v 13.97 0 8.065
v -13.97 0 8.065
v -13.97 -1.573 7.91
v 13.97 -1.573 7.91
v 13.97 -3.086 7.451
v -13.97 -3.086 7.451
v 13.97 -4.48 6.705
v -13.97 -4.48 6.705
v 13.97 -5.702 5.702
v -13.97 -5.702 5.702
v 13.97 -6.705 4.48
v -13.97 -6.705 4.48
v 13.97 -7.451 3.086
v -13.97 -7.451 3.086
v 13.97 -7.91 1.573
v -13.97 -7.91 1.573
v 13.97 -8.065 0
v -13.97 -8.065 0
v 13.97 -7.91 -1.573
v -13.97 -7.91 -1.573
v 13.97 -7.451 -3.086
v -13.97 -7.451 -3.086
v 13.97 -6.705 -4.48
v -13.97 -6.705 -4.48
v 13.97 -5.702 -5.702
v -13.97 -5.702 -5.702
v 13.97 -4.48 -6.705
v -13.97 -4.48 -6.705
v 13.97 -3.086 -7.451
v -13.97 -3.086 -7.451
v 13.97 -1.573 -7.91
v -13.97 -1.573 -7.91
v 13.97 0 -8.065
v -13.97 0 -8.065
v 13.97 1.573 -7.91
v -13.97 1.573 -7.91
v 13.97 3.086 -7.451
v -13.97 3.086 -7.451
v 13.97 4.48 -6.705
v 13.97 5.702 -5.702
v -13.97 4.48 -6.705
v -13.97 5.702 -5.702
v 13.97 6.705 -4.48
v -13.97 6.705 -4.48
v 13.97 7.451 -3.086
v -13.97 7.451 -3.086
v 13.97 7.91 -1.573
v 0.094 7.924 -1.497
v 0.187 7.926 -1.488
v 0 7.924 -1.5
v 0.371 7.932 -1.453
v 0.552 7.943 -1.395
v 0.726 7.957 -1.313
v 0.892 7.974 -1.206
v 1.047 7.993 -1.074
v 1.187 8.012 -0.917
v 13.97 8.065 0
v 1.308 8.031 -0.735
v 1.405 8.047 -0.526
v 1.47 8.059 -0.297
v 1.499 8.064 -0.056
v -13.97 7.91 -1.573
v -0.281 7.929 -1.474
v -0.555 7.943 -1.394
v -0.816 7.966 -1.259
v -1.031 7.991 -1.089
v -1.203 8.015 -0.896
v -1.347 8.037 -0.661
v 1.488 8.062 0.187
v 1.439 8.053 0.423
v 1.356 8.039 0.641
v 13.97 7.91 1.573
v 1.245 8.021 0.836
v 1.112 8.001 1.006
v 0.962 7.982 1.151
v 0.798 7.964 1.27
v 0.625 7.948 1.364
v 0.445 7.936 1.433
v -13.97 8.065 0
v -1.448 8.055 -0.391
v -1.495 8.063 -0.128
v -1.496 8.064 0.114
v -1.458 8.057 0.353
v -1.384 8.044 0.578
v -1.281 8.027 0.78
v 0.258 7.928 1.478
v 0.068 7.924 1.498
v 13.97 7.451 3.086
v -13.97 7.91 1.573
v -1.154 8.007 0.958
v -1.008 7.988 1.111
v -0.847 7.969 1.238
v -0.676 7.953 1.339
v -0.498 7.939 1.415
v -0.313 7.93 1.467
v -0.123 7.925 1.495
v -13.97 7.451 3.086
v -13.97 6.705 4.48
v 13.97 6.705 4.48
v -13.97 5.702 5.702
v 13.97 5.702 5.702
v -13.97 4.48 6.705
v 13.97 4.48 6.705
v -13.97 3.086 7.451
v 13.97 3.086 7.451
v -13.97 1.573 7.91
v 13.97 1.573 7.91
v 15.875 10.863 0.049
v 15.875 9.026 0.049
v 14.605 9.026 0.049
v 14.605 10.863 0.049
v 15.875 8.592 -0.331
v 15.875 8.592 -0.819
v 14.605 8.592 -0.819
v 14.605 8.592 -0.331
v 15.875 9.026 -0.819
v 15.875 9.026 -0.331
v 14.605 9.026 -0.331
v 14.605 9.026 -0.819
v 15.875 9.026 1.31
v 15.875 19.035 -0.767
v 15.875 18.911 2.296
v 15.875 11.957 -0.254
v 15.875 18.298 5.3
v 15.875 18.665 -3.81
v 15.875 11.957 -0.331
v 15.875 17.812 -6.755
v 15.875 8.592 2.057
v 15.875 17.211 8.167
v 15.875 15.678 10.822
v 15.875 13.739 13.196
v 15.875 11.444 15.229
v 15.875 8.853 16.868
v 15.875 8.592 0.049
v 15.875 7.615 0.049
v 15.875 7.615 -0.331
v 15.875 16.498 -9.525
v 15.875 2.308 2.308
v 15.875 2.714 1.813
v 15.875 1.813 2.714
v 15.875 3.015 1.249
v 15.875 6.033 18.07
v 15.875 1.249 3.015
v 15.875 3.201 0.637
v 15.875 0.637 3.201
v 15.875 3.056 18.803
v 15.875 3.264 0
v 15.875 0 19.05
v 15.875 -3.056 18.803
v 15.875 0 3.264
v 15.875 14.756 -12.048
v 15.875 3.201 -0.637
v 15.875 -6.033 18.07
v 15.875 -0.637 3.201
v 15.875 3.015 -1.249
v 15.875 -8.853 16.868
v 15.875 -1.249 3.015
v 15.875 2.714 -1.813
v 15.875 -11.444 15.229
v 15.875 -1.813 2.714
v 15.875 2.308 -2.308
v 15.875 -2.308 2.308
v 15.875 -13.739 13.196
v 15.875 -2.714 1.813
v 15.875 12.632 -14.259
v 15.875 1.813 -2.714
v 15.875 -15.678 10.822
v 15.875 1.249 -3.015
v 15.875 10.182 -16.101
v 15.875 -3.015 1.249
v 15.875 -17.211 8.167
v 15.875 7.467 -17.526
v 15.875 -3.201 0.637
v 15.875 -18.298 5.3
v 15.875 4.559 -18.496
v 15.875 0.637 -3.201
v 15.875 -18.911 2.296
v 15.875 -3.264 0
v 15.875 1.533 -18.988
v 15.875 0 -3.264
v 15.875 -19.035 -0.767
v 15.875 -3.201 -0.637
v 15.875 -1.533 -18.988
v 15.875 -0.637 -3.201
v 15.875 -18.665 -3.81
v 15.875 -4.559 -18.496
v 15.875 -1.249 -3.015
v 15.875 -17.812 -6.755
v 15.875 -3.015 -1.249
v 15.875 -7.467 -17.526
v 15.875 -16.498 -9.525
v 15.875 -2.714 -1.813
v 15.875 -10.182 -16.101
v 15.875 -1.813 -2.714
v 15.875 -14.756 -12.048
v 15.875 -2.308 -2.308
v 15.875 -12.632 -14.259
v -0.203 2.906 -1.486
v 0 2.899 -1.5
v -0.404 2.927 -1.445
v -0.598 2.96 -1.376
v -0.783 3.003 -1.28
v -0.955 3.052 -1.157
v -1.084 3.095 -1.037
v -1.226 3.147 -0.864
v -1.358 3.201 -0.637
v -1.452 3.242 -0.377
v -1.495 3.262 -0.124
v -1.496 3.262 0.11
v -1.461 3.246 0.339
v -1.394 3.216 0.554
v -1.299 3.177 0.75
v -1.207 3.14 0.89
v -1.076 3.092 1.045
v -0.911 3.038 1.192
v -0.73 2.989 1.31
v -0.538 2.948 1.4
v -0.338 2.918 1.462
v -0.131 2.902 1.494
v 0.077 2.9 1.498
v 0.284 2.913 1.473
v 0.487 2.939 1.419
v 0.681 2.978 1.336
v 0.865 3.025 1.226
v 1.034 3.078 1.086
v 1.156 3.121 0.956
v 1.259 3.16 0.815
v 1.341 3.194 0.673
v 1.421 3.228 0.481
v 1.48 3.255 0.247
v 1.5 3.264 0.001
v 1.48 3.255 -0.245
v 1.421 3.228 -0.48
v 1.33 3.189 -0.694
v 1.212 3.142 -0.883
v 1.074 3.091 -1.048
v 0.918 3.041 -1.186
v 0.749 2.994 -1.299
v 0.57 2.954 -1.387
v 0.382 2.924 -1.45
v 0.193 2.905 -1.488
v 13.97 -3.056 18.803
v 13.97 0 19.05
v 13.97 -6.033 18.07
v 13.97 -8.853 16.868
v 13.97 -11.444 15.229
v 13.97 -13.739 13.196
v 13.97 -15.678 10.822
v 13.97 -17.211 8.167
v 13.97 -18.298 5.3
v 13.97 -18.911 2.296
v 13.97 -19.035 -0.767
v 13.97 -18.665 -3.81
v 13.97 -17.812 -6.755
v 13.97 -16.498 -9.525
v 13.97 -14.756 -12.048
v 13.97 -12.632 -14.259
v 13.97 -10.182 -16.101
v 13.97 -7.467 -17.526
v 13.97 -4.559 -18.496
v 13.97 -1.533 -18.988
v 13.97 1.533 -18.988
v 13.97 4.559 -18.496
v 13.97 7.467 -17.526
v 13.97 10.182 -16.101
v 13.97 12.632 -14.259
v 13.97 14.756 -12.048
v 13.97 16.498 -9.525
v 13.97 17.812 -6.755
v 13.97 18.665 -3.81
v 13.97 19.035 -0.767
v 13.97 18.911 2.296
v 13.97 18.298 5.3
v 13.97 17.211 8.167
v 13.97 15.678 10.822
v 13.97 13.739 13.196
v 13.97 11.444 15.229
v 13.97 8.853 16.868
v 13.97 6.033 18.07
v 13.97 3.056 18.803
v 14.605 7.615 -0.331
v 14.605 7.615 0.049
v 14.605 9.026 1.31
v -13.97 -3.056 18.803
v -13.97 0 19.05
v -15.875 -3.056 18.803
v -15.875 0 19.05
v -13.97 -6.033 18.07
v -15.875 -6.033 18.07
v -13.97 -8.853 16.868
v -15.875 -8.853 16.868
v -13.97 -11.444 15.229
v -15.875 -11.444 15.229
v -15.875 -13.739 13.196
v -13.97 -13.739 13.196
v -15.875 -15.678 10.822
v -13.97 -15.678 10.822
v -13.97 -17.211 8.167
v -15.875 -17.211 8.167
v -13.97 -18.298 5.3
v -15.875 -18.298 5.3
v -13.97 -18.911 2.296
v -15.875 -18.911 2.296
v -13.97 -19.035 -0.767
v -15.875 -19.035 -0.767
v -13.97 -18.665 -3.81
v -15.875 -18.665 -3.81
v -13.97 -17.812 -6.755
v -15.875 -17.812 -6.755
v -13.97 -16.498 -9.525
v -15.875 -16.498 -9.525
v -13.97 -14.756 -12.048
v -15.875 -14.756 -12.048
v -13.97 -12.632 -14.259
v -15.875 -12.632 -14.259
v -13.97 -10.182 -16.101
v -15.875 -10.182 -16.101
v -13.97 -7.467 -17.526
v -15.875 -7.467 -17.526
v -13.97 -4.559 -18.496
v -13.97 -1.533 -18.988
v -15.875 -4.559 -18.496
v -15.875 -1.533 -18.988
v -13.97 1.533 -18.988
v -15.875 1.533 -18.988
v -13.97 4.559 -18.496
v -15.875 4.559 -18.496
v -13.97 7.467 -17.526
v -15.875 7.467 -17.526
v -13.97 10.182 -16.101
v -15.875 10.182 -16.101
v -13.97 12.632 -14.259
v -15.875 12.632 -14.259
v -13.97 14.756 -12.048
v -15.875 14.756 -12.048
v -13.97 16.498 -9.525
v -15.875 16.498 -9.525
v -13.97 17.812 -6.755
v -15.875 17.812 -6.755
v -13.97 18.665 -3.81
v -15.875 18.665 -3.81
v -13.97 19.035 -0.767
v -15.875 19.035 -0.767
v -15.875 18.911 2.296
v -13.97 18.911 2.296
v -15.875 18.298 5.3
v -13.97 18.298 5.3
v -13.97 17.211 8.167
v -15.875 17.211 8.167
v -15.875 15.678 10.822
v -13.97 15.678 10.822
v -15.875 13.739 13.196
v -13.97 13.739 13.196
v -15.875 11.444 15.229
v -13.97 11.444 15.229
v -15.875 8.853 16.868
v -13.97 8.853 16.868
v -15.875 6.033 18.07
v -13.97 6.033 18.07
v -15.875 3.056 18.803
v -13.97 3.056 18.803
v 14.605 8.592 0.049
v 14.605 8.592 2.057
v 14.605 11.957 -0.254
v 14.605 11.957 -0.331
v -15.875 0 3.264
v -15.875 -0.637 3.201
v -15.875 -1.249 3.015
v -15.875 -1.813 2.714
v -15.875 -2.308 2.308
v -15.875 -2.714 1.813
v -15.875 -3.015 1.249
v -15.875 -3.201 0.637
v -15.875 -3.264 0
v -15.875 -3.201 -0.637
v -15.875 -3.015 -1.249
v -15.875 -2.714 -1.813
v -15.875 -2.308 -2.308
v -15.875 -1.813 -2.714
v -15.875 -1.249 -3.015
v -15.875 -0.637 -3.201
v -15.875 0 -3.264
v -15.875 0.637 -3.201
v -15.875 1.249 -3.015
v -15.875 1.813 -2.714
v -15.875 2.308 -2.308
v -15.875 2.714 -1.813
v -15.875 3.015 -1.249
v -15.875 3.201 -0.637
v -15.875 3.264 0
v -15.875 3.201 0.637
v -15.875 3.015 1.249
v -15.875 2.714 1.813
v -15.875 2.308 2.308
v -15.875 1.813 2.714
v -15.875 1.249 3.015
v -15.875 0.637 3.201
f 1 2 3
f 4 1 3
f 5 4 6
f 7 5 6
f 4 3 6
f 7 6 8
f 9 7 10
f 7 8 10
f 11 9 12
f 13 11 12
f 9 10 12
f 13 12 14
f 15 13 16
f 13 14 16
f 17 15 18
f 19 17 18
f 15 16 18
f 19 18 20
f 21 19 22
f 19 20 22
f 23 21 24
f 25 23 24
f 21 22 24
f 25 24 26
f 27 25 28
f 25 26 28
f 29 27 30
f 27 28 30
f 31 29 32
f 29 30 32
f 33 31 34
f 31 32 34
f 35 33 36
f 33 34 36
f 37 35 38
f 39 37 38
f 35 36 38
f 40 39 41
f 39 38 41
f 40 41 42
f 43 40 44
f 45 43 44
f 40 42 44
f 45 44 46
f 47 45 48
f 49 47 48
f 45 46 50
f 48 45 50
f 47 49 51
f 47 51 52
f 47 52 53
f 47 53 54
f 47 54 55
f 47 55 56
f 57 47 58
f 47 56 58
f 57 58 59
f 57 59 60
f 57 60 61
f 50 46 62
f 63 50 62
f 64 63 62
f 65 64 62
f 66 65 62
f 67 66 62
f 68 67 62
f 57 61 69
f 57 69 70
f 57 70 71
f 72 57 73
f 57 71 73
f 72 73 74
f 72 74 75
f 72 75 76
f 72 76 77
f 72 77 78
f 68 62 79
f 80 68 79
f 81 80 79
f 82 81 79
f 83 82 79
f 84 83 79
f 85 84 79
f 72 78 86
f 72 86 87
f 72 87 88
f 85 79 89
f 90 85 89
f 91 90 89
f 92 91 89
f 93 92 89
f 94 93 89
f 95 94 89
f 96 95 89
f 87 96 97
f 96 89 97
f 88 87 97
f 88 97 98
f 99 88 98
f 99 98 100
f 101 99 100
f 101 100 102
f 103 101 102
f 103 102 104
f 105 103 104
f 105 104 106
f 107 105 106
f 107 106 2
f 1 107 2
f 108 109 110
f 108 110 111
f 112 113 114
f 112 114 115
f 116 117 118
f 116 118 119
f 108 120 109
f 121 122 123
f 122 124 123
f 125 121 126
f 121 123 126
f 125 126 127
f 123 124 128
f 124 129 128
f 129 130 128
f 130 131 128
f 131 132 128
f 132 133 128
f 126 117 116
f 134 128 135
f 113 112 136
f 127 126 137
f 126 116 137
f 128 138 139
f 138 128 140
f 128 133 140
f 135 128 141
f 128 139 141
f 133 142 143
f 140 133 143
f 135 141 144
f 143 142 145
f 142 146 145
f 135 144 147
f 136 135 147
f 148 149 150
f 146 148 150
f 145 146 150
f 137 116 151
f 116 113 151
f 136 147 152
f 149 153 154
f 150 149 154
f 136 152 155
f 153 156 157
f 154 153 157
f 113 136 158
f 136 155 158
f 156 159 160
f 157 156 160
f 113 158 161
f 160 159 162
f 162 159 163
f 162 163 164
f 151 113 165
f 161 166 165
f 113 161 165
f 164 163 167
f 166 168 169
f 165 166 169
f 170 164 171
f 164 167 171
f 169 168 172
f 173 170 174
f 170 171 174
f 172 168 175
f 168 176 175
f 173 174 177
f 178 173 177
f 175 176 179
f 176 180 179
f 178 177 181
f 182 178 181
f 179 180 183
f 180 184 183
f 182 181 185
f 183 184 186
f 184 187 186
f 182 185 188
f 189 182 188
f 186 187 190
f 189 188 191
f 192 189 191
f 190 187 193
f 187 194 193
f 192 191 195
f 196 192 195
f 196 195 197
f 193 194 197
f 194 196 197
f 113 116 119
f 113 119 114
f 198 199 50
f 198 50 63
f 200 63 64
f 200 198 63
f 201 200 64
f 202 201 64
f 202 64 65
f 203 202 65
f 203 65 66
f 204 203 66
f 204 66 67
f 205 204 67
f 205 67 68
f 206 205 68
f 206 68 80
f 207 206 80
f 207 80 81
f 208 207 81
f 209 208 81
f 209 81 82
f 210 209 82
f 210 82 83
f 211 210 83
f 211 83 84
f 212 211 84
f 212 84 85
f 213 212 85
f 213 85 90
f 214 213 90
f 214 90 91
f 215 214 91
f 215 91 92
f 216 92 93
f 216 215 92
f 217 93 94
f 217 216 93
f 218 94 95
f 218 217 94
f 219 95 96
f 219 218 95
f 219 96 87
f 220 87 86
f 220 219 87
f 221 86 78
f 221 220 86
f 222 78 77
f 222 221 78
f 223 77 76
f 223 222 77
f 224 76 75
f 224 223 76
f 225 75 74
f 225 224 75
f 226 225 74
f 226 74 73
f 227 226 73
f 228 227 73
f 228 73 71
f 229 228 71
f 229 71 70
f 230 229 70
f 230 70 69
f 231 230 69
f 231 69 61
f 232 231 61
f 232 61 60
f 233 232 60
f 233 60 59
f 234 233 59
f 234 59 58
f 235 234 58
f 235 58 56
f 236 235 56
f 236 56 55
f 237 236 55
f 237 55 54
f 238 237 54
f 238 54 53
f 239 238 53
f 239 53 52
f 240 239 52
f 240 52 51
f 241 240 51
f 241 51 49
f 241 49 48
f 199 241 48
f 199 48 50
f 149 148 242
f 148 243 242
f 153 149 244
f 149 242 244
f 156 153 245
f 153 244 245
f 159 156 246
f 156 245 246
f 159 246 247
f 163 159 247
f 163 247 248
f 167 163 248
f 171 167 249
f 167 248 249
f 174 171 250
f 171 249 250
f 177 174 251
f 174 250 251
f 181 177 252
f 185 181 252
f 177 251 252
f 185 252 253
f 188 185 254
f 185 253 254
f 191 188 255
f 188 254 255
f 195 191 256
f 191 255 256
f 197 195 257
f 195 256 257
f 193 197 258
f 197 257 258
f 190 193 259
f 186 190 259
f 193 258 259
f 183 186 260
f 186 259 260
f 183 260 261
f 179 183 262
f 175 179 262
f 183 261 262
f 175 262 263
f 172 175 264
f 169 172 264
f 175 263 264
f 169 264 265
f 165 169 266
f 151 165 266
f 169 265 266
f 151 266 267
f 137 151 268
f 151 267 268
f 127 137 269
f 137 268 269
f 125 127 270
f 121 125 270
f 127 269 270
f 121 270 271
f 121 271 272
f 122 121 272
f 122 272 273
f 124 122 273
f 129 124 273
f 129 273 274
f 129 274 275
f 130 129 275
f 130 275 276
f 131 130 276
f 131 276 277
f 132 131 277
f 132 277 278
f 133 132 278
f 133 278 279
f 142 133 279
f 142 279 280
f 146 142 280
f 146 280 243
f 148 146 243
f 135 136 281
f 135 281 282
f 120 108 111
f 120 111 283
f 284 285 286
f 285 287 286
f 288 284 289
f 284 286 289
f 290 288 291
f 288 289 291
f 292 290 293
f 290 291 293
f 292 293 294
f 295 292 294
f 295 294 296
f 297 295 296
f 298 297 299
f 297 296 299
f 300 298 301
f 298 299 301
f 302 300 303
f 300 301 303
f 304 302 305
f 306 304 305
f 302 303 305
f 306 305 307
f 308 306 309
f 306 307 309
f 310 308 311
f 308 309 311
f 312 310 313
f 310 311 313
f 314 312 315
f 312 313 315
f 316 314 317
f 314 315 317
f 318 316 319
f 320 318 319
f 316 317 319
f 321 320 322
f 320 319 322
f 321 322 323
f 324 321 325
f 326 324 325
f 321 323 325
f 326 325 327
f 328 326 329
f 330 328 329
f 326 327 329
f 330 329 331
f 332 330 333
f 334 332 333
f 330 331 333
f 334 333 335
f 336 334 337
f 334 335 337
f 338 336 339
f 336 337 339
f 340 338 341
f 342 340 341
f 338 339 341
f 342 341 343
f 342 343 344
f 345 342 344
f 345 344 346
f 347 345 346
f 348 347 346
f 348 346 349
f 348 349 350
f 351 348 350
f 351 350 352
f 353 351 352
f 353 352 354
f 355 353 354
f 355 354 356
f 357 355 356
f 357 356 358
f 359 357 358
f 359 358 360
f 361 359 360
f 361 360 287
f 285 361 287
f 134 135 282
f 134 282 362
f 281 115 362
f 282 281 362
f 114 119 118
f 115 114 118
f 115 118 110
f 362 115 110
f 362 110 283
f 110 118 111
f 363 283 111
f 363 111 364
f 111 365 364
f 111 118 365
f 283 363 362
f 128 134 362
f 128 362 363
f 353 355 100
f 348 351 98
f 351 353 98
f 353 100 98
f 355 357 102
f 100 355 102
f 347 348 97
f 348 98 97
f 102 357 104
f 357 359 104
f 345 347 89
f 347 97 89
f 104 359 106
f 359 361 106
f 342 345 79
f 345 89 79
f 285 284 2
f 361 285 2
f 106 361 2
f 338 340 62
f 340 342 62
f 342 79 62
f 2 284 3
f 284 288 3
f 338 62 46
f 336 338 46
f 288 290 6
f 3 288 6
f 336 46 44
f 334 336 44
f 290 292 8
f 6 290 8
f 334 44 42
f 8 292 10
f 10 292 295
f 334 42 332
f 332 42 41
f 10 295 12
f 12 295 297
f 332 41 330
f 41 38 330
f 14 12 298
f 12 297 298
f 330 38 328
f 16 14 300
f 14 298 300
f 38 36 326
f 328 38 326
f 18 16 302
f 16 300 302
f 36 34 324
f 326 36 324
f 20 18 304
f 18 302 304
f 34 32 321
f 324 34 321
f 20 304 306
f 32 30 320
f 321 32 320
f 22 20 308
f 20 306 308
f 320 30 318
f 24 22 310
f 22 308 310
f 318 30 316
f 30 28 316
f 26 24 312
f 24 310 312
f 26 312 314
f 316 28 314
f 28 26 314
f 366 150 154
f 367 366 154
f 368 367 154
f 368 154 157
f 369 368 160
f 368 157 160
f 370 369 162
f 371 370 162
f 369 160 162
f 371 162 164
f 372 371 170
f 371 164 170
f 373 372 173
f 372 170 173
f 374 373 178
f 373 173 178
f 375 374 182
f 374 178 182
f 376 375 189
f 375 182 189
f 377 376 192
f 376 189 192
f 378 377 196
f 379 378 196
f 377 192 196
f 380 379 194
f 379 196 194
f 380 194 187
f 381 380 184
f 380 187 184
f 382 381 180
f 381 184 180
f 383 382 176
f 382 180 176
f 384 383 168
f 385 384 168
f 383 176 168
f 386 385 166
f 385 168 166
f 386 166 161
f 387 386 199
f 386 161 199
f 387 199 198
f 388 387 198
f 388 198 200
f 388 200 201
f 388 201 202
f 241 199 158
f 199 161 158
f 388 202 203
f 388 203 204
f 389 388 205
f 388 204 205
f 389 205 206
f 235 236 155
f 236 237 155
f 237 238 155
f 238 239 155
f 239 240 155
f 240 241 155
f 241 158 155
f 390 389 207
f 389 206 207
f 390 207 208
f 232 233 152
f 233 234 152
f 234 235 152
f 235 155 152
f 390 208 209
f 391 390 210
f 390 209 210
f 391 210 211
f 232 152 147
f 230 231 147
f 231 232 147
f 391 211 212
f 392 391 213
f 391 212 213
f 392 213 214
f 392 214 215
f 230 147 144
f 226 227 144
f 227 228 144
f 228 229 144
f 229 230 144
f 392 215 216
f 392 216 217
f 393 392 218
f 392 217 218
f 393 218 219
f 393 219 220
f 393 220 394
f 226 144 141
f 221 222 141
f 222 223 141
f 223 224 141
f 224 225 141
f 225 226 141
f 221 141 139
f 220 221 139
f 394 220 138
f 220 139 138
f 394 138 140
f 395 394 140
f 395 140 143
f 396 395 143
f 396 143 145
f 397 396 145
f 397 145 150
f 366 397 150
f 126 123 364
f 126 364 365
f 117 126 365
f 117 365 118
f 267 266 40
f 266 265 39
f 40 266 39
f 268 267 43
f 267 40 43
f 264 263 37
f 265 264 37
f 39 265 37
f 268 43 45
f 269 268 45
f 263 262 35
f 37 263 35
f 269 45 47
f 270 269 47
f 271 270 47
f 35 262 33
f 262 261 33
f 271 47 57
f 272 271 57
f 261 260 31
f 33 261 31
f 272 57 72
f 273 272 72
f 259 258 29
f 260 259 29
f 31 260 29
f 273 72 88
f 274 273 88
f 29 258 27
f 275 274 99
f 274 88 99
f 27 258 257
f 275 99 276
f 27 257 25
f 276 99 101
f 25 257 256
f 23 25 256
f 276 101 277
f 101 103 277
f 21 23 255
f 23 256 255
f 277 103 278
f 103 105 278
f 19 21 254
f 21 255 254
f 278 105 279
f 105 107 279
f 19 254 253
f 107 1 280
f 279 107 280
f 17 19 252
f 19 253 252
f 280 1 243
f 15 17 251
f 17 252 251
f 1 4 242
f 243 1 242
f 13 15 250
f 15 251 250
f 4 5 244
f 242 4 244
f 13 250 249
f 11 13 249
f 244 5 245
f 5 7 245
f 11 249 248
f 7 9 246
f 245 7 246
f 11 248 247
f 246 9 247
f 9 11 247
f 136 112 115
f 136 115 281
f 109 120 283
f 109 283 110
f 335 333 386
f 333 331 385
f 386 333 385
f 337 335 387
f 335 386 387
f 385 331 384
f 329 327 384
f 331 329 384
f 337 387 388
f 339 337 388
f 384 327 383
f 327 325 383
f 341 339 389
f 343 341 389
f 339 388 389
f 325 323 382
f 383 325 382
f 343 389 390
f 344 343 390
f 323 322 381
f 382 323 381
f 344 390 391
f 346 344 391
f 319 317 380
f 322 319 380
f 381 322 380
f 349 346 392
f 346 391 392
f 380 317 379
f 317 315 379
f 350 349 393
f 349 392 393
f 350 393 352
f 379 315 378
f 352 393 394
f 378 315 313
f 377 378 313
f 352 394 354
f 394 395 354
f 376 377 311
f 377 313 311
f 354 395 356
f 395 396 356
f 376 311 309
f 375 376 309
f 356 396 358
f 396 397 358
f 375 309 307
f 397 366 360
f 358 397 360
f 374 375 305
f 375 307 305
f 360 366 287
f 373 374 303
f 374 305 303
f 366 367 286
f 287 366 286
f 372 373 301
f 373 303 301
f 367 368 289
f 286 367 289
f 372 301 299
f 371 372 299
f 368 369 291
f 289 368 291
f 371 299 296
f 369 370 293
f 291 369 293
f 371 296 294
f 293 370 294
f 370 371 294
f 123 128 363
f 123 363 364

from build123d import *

# Parameters (mm, degrees)
SKETCH2_R          = 1.5
CUT_EXTRUDE1_DEPTH = 32.270123521
CUT_EXTRUDE2_DEPTH = 1.27


with BuildPart() as part:
    # Sketch1 → Revolve1 (revolve)
    with BuildSketch(Plane.XY):
        Polygon((15.875, 3.2639), (15.875, 19.05), (13.97, 19.05), (13.97, 8.0645), (-13.97, 8.0645), (-13.97, 19.05), (-15.875, 19.05), (-15.875, 3.2639), align=None)
    revolve(axis=Axis((-15.275524476, 0, 0), (1, 0, 0)))

    # Sketch2 → Cut-Extrude1 (cut, through all)
    with BuildSketch(Plane(origin=(0, 0, 0), x_dir=(1, 0, 0), z_dir=(0, 1, 0))):
        Circle(SKETCH2_R)
    extrude(amount=CUT_EXTRUDE1_DEPTH, mode=Mode.SUBTRACT)

    # Sketch3 → Cut-Extrude2 (cut)
    with BuildSketch(Plane(origin=(15.875, 0, 0), x_dir=(0, 0, -1), z_dir=(1, 0, 0))):
        Polygon((0.253501878, 11.957106949), (0.330672017, 11.957106949), (0.330672017, 9.026337718), (0.819133555, 9.026337718), (0.819133555, 8.592149684), (0.330672017, 8.592149684), (0.330672017, 7.615226607), (-0.049242513, 7.615226607), (-0.049242513, 8.592149684), (-2.057362172, 8.592149684), align=None)
        Polygon((-0.049242513, 9.026337718), (-0.049242513, 10.863156629), (-1.310253464, 9.026337718), align=None, mode=Mode.SUBTRACT)
    extrude(amount=-CUT_EXTRUDE2_DEPTH, mode=Mode.SUBTRACT)


solid = part.part
